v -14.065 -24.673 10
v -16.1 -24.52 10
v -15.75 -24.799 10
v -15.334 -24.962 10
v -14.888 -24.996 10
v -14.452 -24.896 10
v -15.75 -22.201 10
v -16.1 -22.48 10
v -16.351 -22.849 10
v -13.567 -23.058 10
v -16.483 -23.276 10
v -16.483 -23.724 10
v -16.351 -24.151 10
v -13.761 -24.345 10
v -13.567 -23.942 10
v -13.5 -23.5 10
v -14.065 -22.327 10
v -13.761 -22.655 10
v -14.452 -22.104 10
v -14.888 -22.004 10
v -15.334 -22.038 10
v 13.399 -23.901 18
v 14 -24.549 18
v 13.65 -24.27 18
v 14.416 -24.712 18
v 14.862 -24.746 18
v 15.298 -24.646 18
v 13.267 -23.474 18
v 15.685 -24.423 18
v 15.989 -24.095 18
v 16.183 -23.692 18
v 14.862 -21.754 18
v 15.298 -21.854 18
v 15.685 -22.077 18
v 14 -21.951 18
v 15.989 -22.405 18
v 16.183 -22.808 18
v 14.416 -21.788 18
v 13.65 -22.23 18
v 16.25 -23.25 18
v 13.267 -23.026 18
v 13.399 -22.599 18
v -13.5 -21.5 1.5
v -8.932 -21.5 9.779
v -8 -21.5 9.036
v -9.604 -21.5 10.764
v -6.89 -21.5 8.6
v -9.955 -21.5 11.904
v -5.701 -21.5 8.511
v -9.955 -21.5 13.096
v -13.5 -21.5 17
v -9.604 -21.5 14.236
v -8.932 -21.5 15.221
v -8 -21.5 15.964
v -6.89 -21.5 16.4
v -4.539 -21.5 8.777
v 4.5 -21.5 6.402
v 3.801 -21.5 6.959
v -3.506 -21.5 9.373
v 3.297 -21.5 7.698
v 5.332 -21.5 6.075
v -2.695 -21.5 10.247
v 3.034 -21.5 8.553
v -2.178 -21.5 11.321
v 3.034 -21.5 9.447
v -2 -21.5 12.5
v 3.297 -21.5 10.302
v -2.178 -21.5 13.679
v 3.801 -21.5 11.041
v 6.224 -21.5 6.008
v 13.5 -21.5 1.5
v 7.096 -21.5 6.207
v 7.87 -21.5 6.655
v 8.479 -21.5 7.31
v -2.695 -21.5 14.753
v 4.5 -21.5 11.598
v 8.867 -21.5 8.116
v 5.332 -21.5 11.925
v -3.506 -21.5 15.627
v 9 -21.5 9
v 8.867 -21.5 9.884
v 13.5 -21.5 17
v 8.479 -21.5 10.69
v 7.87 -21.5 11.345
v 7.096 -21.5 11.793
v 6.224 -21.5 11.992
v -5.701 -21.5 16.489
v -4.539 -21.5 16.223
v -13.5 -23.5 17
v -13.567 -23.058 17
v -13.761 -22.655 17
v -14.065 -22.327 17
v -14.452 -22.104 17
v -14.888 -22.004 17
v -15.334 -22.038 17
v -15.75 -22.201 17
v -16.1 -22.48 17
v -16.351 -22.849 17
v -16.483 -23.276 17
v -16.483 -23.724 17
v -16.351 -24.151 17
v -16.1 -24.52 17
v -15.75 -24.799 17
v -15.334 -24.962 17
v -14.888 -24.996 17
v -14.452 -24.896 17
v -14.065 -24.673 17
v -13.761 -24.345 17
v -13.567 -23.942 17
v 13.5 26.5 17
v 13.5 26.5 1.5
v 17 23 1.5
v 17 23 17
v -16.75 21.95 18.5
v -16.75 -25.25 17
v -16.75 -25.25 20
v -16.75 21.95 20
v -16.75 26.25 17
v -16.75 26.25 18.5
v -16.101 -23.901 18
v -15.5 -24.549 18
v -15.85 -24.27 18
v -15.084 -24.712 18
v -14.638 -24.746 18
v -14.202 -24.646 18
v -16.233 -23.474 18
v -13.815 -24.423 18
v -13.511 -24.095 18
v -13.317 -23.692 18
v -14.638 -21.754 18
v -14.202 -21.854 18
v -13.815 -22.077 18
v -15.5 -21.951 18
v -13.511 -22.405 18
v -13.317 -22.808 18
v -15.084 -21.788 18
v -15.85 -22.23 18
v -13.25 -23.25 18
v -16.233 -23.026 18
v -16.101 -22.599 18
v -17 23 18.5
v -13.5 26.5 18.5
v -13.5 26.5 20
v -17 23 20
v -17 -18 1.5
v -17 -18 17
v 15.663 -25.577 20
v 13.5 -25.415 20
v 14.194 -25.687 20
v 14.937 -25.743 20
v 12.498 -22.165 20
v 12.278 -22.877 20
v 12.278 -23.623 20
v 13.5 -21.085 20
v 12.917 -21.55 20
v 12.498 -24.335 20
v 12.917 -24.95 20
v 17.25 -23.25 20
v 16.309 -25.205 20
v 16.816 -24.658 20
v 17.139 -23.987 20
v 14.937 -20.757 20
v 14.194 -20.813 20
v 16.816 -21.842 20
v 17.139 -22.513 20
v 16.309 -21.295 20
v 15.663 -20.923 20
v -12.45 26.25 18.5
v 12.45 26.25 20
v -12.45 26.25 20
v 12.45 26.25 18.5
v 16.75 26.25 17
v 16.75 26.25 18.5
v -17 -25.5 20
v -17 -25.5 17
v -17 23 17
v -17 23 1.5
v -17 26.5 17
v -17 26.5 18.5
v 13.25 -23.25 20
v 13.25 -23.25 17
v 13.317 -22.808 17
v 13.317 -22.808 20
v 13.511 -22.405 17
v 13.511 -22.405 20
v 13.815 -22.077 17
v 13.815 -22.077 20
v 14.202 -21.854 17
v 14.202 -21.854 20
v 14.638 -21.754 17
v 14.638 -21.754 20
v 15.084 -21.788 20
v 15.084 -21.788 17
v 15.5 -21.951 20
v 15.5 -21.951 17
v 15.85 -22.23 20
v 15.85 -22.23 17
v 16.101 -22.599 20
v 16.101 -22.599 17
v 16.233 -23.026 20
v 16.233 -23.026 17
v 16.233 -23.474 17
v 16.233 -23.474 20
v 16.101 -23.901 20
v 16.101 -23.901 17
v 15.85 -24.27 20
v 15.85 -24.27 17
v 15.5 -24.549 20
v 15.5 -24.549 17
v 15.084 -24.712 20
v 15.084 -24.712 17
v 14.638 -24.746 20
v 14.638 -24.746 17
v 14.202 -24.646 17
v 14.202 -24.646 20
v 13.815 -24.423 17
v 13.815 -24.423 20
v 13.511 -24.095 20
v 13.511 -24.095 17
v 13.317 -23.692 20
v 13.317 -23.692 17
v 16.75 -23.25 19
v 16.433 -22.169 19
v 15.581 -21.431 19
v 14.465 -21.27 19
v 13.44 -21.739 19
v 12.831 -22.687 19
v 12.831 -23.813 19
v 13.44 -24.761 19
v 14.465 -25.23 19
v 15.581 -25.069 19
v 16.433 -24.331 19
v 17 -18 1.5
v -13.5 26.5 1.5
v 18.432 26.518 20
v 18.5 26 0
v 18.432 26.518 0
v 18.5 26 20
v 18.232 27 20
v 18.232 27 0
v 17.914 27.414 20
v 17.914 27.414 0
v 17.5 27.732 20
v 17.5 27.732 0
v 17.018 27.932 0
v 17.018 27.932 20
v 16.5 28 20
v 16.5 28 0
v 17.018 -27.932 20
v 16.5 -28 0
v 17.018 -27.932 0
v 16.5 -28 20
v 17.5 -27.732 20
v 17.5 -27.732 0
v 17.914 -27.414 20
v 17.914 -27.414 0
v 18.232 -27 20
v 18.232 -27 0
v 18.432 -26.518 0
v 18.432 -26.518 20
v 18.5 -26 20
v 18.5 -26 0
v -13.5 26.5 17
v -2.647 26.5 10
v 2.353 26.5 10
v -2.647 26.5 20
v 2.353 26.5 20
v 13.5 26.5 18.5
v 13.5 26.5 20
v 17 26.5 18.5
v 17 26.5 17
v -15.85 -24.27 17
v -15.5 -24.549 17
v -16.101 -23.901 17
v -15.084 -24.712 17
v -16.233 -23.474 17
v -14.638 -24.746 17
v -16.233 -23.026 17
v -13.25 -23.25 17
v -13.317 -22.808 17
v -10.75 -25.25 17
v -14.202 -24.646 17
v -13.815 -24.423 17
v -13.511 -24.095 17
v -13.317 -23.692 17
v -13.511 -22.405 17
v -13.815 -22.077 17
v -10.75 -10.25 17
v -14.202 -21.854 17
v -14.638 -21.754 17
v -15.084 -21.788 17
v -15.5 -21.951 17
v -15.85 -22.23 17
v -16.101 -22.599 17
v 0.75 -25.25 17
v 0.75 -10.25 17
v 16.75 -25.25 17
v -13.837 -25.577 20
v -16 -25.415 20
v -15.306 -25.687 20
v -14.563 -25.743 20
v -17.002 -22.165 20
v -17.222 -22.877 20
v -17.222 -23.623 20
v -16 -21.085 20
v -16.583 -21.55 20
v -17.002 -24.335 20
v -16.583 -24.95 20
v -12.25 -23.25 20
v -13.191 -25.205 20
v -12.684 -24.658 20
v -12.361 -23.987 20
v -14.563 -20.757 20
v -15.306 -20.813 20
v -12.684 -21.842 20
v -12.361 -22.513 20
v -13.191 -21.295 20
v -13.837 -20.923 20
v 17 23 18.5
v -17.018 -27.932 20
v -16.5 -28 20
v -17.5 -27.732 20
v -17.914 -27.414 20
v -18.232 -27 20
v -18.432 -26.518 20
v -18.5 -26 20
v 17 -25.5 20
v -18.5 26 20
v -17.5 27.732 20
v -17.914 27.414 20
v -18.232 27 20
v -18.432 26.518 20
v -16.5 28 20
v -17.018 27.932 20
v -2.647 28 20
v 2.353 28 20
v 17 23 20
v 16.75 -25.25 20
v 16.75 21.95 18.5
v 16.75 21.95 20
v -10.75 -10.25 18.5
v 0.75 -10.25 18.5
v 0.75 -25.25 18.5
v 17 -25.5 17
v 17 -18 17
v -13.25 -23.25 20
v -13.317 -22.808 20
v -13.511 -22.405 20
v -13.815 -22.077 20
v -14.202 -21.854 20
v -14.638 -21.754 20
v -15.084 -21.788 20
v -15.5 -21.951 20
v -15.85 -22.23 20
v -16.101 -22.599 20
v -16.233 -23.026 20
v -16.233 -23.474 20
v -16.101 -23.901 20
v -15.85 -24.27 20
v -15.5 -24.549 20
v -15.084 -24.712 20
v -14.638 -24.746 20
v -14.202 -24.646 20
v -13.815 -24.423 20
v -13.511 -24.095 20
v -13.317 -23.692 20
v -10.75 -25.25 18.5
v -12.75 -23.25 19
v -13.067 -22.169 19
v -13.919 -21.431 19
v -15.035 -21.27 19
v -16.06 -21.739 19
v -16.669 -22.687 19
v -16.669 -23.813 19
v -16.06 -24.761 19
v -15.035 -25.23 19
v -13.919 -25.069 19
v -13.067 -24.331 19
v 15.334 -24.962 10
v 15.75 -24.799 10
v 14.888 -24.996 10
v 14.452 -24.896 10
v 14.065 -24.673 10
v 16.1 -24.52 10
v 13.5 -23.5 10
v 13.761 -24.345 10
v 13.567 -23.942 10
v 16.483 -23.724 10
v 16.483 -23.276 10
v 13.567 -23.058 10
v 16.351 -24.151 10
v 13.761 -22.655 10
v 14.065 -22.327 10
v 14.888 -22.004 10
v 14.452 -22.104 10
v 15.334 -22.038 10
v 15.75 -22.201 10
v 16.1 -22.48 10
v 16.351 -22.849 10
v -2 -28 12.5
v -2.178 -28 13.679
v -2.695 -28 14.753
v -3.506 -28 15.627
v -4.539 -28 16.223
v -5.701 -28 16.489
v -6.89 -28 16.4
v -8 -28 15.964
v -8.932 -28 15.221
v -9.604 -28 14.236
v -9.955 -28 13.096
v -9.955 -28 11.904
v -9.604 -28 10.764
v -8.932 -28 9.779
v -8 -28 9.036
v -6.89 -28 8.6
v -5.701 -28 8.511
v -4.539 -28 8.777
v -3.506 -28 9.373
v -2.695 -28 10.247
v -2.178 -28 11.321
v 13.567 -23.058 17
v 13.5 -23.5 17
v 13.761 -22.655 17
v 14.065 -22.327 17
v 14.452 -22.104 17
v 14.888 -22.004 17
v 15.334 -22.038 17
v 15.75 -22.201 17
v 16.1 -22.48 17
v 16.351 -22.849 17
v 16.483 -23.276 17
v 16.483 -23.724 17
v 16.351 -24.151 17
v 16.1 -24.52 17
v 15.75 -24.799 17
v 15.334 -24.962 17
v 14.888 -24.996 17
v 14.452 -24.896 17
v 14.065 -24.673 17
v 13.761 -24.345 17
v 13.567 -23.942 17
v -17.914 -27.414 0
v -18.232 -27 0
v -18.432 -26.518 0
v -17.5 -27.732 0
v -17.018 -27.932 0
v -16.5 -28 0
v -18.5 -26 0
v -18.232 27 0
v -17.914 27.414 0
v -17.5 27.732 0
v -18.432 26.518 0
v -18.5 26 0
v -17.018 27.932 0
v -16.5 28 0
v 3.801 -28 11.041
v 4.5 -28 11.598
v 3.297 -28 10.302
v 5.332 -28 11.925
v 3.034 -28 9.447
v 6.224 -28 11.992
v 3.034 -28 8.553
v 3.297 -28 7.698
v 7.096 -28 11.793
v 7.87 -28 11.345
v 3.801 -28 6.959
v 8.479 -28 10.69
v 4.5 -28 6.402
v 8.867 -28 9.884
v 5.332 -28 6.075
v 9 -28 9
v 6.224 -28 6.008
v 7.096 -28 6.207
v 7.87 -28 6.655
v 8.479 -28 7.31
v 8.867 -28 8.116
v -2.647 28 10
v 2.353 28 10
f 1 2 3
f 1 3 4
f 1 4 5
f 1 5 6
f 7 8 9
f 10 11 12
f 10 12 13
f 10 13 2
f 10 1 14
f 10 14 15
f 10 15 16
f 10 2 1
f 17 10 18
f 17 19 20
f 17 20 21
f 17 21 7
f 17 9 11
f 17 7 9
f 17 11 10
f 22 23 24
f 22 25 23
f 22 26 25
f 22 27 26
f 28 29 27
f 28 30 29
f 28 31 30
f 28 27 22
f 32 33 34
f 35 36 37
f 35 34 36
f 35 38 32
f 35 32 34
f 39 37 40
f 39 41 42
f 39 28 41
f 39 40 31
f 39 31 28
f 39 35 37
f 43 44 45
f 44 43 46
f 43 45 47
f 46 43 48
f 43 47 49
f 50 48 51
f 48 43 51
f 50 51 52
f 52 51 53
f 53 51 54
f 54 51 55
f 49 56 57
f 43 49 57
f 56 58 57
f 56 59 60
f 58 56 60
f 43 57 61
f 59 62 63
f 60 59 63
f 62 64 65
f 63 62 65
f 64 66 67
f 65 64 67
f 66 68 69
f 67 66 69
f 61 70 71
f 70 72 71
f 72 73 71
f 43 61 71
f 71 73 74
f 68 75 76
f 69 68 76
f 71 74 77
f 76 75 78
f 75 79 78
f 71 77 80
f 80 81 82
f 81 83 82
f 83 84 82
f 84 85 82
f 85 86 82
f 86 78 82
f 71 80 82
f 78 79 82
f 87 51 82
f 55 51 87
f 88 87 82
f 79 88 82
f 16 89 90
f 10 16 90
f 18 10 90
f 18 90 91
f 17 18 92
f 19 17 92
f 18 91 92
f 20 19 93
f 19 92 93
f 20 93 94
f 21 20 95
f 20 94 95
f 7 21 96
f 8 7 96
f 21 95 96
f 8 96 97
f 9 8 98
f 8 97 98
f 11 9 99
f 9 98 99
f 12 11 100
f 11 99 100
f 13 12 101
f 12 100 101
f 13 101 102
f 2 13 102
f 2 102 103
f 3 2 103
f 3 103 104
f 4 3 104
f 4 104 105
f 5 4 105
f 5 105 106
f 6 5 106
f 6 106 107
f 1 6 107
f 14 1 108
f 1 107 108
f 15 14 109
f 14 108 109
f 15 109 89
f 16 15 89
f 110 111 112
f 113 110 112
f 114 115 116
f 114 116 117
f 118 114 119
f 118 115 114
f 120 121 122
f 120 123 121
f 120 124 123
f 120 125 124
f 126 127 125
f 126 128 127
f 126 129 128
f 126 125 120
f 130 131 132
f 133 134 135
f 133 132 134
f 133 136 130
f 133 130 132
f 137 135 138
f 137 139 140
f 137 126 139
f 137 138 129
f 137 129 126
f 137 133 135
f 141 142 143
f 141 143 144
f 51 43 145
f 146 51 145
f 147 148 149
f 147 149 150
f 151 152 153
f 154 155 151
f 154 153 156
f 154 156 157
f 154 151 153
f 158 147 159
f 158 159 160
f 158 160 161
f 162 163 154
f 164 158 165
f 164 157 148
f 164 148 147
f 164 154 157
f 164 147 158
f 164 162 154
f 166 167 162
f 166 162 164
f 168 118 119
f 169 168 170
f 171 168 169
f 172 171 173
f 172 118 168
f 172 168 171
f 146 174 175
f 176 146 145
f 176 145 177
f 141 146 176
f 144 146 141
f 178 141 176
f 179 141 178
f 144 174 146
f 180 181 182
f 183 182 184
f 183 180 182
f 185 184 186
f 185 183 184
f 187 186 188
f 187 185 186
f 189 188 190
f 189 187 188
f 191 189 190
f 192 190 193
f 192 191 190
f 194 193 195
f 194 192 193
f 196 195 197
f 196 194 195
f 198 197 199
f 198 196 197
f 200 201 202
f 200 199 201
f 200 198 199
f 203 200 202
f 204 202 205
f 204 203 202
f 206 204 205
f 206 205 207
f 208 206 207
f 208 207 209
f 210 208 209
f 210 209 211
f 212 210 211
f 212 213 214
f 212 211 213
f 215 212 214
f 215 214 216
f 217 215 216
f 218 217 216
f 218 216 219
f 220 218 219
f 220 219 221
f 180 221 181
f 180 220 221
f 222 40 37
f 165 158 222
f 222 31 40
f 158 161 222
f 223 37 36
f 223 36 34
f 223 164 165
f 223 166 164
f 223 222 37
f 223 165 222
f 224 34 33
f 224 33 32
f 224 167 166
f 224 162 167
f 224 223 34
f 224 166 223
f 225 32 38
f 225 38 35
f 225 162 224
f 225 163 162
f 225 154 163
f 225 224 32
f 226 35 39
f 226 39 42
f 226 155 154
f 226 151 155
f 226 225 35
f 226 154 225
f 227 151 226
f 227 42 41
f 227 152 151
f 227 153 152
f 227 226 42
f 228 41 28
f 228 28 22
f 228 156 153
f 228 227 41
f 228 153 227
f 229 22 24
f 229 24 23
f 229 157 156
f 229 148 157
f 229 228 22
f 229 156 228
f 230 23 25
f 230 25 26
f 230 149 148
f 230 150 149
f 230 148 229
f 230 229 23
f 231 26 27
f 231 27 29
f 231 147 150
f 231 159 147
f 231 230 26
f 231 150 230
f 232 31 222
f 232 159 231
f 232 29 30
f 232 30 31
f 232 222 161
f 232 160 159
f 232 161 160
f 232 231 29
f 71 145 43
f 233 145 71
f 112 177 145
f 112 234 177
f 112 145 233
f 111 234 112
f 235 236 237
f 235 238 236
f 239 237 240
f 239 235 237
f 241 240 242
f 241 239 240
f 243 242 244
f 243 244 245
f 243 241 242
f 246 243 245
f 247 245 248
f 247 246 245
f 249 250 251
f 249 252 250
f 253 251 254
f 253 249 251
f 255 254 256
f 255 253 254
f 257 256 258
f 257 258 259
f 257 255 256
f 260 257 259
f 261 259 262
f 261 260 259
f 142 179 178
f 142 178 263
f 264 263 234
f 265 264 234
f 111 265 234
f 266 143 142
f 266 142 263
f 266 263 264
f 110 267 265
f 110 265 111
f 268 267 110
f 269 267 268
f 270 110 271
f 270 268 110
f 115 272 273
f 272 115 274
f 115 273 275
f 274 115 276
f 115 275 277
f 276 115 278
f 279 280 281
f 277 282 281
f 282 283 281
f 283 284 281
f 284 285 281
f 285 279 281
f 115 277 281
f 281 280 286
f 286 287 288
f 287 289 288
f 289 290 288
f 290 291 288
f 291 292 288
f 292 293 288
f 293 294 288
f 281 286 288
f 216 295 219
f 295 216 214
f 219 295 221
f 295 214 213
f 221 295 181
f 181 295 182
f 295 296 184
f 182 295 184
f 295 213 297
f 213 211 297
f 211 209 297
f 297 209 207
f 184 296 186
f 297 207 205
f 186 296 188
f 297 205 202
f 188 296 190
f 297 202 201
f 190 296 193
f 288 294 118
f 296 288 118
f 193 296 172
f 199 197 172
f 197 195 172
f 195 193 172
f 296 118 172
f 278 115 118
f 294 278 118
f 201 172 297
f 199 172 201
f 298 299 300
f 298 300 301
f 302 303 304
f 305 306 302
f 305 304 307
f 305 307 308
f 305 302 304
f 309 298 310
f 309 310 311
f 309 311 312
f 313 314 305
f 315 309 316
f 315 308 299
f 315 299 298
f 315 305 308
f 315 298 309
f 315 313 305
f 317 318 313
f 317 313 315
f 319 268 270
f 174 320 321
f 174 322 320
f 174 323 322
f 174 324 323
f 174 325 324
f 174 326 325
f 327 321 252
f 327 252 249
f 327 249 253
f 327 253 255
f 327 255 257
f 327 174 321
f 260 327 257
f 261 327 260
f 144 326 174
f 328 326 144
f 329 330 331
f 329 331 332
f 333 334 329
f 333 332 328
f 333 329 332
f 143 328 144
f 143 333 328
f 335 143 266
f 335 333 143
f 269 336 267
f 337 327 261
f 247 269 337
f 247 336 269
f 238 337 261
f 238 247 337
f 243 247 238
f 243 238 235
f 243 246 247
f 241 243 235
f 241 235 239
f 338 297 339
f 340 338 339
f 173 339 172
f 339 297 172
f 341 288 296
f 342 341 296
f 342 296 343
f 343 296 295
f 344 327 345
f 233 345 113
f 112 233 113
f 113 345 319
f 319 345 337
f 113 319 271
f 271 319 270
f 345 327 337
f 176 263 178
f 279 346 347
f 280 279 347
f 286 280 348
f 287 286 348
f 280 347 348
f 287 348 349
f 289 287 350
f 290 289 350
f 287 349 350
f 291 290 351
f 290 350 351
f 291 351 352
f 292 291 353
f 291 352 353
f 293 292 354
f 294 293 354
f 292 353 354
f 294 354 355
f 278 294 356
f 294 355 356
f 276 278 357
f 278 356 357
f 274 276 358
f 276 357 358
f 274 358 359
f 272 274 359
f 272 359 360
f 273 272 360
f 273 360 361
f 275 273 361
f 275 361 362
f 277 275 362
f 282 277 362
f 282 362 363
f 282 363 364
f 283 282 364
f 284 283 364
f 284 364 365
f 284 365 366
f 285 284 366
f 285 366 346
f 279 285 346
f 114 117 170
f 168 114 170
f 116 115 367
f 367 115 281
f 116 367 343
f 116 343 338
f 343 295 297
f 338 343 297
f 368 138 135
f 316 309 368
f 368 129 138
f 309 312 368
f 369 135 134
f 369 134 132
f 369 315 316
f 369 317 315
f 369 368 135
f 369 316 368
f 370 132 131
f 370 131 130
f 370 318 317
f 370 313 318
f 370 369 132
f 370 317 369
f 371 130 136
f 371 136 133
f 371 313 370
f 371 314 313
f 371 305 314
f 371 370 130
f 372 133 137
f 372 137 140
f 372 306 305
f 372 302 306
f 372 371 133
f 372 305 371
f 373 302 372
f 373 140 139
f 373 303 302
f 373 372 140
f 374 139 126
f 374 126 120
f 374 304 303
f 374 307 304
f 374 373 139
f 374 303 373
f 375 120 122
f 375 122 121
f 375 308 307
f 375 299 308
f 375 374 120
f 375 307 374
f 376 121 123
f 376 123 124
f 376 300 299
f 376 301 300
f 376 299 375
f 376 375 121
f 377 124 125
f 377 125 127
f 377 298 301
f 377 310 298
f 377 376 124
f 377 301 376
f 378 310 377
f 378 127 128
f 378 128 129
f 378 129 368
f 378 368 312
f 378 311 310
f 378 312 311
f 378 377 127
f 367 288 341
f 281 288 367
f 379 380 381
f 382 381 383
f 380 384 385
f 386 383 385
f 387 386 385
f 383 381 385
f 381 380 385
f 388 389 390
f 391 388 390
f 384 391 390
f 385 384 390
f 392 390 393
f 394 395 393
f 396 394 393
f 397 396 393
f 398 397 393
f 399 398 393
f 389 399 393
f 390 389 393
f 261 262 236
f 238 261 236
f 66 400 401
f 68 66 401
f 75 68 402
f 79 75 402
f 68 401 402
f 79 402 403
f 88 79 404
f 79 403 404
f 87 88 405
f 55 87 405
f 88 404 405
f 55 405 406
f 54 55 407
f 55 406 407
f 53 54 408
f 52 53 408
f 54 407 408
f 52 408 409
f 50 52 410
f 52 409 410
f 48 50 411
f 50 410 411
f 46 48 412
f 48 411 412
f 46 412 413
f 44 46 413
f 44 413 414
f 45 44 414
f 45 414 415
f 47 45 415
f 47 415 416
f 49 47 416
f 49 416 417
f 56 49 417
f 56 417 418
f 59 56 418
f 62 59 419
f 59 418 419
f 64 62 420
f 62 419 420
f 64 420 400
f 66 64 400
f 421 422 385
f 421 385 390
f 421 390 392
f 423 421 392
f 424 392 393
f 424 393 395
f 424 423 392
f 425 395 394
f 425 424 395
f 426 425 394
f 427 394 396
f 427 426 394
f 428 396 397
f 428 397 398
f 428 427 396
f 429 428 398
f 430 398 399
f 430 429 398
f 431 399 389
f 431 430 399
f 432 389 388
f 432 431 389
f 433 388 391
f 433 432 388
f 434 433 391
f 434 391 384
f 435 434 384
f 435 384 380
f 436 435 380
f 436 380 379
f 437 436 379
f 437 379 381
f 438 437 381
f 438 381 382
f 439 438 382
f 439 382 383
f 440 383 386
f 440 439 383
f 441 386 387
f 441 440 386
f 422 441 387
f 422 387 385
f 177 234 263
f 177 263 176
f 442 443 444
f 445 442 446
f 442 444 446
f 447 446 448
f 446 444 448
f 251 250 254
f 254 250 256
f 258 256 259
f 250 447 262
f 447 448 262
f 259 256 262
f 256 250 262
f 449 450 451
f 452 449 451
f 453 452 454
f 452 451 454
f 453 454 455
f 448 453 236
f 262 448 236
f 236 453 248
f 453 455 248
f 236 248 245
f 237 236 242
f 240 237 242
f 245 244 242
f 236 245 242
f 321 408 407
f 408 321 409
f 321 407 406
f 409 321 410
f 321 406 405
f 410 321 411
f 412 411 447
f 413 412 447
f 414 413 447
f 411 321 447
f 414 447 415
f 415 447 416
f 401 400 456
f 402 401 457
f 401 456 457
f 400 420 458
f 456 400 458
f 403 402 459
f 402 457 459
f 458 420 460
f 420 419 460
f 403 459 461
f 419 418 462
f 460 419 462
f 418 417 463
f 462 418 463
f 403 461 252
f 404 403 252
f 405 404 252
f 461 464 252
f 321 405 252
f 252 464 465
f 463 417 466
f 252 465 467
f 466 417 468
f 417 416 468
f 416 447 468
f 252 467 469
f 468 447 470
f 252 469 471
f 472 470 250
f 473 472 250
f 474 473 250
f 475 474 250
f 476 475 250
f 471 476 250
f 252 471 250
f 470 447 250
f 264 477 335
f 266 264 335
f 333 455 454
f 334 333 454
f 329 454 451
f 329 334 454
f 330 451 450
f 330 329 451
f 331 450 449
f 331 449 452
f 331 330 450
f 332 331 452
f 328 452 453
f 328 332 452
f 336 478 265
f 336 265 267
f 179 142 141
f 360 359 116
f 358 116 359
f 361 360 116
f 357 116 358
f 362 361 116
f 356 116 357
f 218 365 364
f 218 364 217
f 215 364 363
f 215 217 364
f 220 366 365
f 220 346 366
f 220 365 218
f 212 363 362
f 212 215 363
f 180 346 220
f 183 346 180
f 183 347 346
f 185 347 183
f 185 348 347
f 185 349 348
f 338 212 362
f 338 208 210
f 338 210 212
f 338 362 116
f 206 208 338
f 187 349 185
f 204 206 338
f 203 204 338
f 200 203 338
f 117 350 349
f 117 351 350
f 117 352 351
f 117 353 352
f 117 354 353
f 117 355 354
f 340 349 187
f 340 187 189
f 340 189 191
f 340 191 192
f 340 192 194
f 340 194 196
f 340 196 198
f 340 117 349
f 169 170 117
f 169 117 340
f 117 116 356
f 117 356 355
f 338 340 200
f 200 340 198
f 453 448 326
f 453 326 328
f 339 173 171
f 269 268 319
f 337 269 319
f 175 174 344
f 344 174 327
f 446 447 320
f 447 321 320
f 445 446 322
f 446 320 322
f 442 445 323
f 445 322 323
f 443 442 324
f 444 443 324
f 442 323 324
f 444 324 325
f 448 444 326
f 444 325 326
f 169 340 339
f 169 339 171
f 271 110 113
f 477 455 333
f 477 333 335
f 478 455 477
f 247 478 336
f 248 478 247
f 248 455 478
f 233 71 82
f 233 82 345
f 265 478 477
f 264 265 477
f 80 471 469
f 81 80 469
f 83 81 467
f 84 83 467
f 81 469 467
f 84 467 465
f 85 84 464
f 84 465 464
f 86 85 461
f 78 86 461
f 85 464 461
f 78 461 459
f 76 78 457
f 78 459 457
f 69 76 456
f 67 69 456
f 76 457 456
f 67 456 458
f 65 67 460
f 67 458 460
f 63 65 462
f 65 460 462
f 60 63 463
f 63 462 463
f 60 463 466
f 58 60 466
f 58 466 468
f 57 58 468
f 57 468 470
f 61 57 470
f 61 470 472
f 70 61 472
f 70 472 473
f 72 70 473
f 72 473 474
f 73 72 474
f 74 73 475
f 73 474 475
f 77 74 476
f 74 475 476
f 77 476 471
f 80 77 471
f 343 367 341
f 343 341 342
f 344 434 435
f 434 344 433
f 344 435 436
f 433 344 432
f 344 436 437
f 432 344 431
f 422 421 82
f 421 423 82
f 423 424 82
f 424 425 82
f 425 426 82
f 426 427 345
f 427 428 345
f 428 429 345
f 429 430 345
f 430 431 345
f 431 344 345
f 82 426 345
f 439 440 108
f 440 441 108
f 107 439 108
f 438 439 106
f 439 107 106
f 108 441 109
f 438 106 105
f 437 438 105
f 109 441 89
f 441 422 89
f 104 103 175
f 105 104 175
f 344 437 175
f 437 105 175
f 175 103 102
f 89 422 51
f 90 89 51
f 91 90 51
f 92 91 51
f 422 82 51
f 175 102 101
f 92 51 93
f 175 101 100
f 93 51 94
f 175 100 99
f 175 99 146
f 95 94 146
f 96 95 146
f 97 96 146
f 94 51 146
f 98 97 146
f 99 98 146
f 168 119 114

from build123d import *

# Parameters (mm, degrees)
SKETCH_W        = 37
SKETCH_H        = 56
PAD_DEPTH       = 20
SKETCH001_W     = 34
SKETCH001_H     = 48
POCKET_DEPTH    = 18.5
PAD001_DEPTH    = 15.5
SKETCH003_R     = 3
SKETCH003_R_2   = 4
POCKET001_DEPTH = 6.5
SKETCH004_W     = 34
SKETCH004_H     = 4
POCKET002_DEPTH = 3
PAD002_DEPTH    = 1.5
SKETCH006_R     = 1.5
POCKET003_DEPTH = 7
FILLET_R        = 2
SKETCH010_W     = 5
SKETCH010_H     = 10
POCKET006_DEPTH = 5
SKETCH007_W     = 33.5
SKETCH007_H     = 51.5
PAD003_DEPTH    = 3
POCKET004_DEPTH = 1.5
SKETCH009_R     = 1.5
POCKET005_DEPTH = 126.021324
SKETCH011_W     = 11.5
SKETCH011_H     = 15
POCKET007_DEPTH = 1.5


with BuildPart() as body:
    # Sketch → Pad (new body)
    with BuildSketch(Plane.XY):
        Rectangle(SKETCH_W, SKETCH_H)
    extrude(amount=PAD_DEPTH)

    # Sketch001 (on Face6 of Pad) → Pocket (cut)
    with BuildSketch(Plane.XY.offset(20)):
        with Locations((0, 2.5)):
            Rectangle(SKETCH001_W, SKETCH001_H)
    extrude(amount=-POCKET_DEPTH, mode=Mode.SUBTRACT)

    # Sketch002 (on Face11 of Pocket) → Pad001 (join)
    with BuildSketch(Plane.XY.offset(1.5)):
        Polygon((-17, 23), (-17, 26.5), (-13.5, 26.5), align=None)
        Polygon((-17, -18), (-17, -21.5), (-13.5, -21.5), align=None)
    pad001 = extrude(amount=PAD001_DEPTH)

    # Mirrored: Pad001 across Sketch002 V_Axis
    add(pad001.mirror(Plane(origin=(0, 0, 1.5), x_dir=(0, 0, 1), z_dir=(1, 0, 0))))

    # Sketch003 (on Face6 of Mirrored) → Pocket001 (cut)
    with BuildSketch(Plane.XZ.offset(28)):
        with Locations((6, 9)):
            Circle(SKETCH003_R)
        with Locations((-6, 12.5)):
            Circle(SKETCH003_R_2)
    extrude(amount=-POCKET001_DEPTH, mode=Mode.SUBTRACT)

    # Sketch004 (on Face4 of Pocket001) → Pocket002 (cut)
    with BuildSketch(Plane.XY.offset(20)):
        with Locations((0, -23.5)):
            Rectangle(SKETCH004_W, SKETCH004_H)
    extrude(amount=-POCKET002_DEPTH, mode=Mode.SUBTRACT)

    # Sketch005 (on Face15 of Pocket002) → Pad002 (join)
    with BuildSketch(Plane.XY.offset(18.5)):
        Polygon((-17, 23), (-17, 26.5), (-13.5, 26.5), align=None)
    pad002 = extrude(amount=PAD002_DEPTH)

    # Mirrored001: Pad002 across Sketch005 V_Axis
    add(pad002.mirror(Plane(origin=(0, 0, 18.5), x_dir=(0, 0, 1), z_dir=(1, 0, 0))))

    # Sketch006 (on Face28 of Mirrored001) → Pocket003 (cut)
    with BuildSketch(Plane.XY.offset(17)):
        with Locations((-15, -23.5)):
            Circle(SKETCH006_R)
    pocket003 = extrude(amount=-POCKET003_DEPTH, mode=Mode.SUBTRACT)

    # Mirrored002: Pocket003 across Sketch006 V_Axis
    add(pocket003.mirror(Plane(origin=(0, 0, 17), x_dir=(0, 0, 1), z_dir=(1, 0, 0))), mode=Mode.SUBTRACT)

    # Fillet
    fillet_edges = [body.edges().sort_by_distance(p)[0] for p in [
        (18.5, -28, 10),
        (-18.5, -28, 10),
        (-18.5, 28, 10),
        (18.5, 28, 10),
    ]]
    fillet(fillet_edges, radius=FILLET_R)

    # Sketch010 (on Face1 of Fillet) → Pocket006 (cut)
    with BuildSketch(Plane(origin=(0, 28, 0), x_dir=(-1, 0, 0), z_dir=(0, 1, 0))):
        with Locations((0.147406, 15)):
            Rectangle(SKETCH010_W, SKETCH010_H)
    extrude(amount=-POCKET006_DEPTH, mode=Mode.SUBTRACT)


with BuildPart() as body001:
    # Sketch007 → Pad003 (new body)
    with BuildSketch(Plane.XY):
        Rectangle(SKETCH007_W, SKETCH007_H)
    extrude(amount=PAD003_DEPTH)

    # Sketch008 (on Face6 of Pad003) → Pocket004 (cut)
    with BuildSketch(Plane.XY.offset(3)):
        Polygon((-16.75, 25.75), (-16.75, 21.45), (-12.45, 25.75), align=None)
        Polygon((12.45, 25.75), (16.75, 25.75), (16.75, 21.45), align=None)
    extrude(amount=-POCKET004_DEPTH, mode=Mode.SUBTRACT)

    # Sketch009 (on Face6 of Pocket004) → Pocket005 (cut, through all)
    with BuildSketch(Plane.XY.offset(3)):
        with Locations((-14.75, -23.75)):
            Circle(SKETCH009_R)
    pocket005 = extrude(amount=-POCKET005_DEPTH, mode=Mode.SUBTRACT)

    # Mirrored003: Pocket005 across Sketch009 V_Axis
    add(pocket005.mirror(Plane(origin=(0, 0, 3), x_dir=(0, 0, 1), z_dir=(1, 0, 0))), mode=Mode.SUBTRACT)

    # Sketch011 (on Face2 of Mirrored003) → Pocket007 (cut)
    with BuildSketch(Plane(origin=(0, 0, 0), x_dir=(1, 0, 0), z_dir=(0, 0, -1))):
        with Locations((-5, 18.25)):
            Rectangle(SKETCH011_W, SKETCH011_H)
    extrude(amount=-POCKET007_DEPTH, mode=Mode.SUBTRACT)


with BuildPart() as body001_1:
    # Body001 placement: moved
    add(body001.part.moved(Location((0, 0.5, 17))))


with BuildPart() as cone:
    # Cone → Cone (revolve)
    with BuildSketch(Plane(origin=(-14.75, -23.25, 18), x_dir=(1, 0, 0), z_dir=(0, -1, 0))):
        Polygon((0, 0), (1.5, 0), (2.5, 2), (0, 2), align=None)
    revolve(axis=Axis((-14.75, -23.25, 18), (0, 0, 1)))


with BuildPart() as cone001:
    # Cone001 → Cone001 (revolve)
    with BuildSketch(Plane(origin=(14.75, -23.25, 18), x_dir=(1, 0, 0), z_dir=(0, -1, 0))):
        Polygon((0, 0), (1.5, 0), (2.5, 2), (0, 2), align=None)
    revolve(axis=Axis((14.75, -23.25, 18), (0, 0, 1)))


solid = Compound([body.part, body001_1.part, cone.part, cone001.part])
